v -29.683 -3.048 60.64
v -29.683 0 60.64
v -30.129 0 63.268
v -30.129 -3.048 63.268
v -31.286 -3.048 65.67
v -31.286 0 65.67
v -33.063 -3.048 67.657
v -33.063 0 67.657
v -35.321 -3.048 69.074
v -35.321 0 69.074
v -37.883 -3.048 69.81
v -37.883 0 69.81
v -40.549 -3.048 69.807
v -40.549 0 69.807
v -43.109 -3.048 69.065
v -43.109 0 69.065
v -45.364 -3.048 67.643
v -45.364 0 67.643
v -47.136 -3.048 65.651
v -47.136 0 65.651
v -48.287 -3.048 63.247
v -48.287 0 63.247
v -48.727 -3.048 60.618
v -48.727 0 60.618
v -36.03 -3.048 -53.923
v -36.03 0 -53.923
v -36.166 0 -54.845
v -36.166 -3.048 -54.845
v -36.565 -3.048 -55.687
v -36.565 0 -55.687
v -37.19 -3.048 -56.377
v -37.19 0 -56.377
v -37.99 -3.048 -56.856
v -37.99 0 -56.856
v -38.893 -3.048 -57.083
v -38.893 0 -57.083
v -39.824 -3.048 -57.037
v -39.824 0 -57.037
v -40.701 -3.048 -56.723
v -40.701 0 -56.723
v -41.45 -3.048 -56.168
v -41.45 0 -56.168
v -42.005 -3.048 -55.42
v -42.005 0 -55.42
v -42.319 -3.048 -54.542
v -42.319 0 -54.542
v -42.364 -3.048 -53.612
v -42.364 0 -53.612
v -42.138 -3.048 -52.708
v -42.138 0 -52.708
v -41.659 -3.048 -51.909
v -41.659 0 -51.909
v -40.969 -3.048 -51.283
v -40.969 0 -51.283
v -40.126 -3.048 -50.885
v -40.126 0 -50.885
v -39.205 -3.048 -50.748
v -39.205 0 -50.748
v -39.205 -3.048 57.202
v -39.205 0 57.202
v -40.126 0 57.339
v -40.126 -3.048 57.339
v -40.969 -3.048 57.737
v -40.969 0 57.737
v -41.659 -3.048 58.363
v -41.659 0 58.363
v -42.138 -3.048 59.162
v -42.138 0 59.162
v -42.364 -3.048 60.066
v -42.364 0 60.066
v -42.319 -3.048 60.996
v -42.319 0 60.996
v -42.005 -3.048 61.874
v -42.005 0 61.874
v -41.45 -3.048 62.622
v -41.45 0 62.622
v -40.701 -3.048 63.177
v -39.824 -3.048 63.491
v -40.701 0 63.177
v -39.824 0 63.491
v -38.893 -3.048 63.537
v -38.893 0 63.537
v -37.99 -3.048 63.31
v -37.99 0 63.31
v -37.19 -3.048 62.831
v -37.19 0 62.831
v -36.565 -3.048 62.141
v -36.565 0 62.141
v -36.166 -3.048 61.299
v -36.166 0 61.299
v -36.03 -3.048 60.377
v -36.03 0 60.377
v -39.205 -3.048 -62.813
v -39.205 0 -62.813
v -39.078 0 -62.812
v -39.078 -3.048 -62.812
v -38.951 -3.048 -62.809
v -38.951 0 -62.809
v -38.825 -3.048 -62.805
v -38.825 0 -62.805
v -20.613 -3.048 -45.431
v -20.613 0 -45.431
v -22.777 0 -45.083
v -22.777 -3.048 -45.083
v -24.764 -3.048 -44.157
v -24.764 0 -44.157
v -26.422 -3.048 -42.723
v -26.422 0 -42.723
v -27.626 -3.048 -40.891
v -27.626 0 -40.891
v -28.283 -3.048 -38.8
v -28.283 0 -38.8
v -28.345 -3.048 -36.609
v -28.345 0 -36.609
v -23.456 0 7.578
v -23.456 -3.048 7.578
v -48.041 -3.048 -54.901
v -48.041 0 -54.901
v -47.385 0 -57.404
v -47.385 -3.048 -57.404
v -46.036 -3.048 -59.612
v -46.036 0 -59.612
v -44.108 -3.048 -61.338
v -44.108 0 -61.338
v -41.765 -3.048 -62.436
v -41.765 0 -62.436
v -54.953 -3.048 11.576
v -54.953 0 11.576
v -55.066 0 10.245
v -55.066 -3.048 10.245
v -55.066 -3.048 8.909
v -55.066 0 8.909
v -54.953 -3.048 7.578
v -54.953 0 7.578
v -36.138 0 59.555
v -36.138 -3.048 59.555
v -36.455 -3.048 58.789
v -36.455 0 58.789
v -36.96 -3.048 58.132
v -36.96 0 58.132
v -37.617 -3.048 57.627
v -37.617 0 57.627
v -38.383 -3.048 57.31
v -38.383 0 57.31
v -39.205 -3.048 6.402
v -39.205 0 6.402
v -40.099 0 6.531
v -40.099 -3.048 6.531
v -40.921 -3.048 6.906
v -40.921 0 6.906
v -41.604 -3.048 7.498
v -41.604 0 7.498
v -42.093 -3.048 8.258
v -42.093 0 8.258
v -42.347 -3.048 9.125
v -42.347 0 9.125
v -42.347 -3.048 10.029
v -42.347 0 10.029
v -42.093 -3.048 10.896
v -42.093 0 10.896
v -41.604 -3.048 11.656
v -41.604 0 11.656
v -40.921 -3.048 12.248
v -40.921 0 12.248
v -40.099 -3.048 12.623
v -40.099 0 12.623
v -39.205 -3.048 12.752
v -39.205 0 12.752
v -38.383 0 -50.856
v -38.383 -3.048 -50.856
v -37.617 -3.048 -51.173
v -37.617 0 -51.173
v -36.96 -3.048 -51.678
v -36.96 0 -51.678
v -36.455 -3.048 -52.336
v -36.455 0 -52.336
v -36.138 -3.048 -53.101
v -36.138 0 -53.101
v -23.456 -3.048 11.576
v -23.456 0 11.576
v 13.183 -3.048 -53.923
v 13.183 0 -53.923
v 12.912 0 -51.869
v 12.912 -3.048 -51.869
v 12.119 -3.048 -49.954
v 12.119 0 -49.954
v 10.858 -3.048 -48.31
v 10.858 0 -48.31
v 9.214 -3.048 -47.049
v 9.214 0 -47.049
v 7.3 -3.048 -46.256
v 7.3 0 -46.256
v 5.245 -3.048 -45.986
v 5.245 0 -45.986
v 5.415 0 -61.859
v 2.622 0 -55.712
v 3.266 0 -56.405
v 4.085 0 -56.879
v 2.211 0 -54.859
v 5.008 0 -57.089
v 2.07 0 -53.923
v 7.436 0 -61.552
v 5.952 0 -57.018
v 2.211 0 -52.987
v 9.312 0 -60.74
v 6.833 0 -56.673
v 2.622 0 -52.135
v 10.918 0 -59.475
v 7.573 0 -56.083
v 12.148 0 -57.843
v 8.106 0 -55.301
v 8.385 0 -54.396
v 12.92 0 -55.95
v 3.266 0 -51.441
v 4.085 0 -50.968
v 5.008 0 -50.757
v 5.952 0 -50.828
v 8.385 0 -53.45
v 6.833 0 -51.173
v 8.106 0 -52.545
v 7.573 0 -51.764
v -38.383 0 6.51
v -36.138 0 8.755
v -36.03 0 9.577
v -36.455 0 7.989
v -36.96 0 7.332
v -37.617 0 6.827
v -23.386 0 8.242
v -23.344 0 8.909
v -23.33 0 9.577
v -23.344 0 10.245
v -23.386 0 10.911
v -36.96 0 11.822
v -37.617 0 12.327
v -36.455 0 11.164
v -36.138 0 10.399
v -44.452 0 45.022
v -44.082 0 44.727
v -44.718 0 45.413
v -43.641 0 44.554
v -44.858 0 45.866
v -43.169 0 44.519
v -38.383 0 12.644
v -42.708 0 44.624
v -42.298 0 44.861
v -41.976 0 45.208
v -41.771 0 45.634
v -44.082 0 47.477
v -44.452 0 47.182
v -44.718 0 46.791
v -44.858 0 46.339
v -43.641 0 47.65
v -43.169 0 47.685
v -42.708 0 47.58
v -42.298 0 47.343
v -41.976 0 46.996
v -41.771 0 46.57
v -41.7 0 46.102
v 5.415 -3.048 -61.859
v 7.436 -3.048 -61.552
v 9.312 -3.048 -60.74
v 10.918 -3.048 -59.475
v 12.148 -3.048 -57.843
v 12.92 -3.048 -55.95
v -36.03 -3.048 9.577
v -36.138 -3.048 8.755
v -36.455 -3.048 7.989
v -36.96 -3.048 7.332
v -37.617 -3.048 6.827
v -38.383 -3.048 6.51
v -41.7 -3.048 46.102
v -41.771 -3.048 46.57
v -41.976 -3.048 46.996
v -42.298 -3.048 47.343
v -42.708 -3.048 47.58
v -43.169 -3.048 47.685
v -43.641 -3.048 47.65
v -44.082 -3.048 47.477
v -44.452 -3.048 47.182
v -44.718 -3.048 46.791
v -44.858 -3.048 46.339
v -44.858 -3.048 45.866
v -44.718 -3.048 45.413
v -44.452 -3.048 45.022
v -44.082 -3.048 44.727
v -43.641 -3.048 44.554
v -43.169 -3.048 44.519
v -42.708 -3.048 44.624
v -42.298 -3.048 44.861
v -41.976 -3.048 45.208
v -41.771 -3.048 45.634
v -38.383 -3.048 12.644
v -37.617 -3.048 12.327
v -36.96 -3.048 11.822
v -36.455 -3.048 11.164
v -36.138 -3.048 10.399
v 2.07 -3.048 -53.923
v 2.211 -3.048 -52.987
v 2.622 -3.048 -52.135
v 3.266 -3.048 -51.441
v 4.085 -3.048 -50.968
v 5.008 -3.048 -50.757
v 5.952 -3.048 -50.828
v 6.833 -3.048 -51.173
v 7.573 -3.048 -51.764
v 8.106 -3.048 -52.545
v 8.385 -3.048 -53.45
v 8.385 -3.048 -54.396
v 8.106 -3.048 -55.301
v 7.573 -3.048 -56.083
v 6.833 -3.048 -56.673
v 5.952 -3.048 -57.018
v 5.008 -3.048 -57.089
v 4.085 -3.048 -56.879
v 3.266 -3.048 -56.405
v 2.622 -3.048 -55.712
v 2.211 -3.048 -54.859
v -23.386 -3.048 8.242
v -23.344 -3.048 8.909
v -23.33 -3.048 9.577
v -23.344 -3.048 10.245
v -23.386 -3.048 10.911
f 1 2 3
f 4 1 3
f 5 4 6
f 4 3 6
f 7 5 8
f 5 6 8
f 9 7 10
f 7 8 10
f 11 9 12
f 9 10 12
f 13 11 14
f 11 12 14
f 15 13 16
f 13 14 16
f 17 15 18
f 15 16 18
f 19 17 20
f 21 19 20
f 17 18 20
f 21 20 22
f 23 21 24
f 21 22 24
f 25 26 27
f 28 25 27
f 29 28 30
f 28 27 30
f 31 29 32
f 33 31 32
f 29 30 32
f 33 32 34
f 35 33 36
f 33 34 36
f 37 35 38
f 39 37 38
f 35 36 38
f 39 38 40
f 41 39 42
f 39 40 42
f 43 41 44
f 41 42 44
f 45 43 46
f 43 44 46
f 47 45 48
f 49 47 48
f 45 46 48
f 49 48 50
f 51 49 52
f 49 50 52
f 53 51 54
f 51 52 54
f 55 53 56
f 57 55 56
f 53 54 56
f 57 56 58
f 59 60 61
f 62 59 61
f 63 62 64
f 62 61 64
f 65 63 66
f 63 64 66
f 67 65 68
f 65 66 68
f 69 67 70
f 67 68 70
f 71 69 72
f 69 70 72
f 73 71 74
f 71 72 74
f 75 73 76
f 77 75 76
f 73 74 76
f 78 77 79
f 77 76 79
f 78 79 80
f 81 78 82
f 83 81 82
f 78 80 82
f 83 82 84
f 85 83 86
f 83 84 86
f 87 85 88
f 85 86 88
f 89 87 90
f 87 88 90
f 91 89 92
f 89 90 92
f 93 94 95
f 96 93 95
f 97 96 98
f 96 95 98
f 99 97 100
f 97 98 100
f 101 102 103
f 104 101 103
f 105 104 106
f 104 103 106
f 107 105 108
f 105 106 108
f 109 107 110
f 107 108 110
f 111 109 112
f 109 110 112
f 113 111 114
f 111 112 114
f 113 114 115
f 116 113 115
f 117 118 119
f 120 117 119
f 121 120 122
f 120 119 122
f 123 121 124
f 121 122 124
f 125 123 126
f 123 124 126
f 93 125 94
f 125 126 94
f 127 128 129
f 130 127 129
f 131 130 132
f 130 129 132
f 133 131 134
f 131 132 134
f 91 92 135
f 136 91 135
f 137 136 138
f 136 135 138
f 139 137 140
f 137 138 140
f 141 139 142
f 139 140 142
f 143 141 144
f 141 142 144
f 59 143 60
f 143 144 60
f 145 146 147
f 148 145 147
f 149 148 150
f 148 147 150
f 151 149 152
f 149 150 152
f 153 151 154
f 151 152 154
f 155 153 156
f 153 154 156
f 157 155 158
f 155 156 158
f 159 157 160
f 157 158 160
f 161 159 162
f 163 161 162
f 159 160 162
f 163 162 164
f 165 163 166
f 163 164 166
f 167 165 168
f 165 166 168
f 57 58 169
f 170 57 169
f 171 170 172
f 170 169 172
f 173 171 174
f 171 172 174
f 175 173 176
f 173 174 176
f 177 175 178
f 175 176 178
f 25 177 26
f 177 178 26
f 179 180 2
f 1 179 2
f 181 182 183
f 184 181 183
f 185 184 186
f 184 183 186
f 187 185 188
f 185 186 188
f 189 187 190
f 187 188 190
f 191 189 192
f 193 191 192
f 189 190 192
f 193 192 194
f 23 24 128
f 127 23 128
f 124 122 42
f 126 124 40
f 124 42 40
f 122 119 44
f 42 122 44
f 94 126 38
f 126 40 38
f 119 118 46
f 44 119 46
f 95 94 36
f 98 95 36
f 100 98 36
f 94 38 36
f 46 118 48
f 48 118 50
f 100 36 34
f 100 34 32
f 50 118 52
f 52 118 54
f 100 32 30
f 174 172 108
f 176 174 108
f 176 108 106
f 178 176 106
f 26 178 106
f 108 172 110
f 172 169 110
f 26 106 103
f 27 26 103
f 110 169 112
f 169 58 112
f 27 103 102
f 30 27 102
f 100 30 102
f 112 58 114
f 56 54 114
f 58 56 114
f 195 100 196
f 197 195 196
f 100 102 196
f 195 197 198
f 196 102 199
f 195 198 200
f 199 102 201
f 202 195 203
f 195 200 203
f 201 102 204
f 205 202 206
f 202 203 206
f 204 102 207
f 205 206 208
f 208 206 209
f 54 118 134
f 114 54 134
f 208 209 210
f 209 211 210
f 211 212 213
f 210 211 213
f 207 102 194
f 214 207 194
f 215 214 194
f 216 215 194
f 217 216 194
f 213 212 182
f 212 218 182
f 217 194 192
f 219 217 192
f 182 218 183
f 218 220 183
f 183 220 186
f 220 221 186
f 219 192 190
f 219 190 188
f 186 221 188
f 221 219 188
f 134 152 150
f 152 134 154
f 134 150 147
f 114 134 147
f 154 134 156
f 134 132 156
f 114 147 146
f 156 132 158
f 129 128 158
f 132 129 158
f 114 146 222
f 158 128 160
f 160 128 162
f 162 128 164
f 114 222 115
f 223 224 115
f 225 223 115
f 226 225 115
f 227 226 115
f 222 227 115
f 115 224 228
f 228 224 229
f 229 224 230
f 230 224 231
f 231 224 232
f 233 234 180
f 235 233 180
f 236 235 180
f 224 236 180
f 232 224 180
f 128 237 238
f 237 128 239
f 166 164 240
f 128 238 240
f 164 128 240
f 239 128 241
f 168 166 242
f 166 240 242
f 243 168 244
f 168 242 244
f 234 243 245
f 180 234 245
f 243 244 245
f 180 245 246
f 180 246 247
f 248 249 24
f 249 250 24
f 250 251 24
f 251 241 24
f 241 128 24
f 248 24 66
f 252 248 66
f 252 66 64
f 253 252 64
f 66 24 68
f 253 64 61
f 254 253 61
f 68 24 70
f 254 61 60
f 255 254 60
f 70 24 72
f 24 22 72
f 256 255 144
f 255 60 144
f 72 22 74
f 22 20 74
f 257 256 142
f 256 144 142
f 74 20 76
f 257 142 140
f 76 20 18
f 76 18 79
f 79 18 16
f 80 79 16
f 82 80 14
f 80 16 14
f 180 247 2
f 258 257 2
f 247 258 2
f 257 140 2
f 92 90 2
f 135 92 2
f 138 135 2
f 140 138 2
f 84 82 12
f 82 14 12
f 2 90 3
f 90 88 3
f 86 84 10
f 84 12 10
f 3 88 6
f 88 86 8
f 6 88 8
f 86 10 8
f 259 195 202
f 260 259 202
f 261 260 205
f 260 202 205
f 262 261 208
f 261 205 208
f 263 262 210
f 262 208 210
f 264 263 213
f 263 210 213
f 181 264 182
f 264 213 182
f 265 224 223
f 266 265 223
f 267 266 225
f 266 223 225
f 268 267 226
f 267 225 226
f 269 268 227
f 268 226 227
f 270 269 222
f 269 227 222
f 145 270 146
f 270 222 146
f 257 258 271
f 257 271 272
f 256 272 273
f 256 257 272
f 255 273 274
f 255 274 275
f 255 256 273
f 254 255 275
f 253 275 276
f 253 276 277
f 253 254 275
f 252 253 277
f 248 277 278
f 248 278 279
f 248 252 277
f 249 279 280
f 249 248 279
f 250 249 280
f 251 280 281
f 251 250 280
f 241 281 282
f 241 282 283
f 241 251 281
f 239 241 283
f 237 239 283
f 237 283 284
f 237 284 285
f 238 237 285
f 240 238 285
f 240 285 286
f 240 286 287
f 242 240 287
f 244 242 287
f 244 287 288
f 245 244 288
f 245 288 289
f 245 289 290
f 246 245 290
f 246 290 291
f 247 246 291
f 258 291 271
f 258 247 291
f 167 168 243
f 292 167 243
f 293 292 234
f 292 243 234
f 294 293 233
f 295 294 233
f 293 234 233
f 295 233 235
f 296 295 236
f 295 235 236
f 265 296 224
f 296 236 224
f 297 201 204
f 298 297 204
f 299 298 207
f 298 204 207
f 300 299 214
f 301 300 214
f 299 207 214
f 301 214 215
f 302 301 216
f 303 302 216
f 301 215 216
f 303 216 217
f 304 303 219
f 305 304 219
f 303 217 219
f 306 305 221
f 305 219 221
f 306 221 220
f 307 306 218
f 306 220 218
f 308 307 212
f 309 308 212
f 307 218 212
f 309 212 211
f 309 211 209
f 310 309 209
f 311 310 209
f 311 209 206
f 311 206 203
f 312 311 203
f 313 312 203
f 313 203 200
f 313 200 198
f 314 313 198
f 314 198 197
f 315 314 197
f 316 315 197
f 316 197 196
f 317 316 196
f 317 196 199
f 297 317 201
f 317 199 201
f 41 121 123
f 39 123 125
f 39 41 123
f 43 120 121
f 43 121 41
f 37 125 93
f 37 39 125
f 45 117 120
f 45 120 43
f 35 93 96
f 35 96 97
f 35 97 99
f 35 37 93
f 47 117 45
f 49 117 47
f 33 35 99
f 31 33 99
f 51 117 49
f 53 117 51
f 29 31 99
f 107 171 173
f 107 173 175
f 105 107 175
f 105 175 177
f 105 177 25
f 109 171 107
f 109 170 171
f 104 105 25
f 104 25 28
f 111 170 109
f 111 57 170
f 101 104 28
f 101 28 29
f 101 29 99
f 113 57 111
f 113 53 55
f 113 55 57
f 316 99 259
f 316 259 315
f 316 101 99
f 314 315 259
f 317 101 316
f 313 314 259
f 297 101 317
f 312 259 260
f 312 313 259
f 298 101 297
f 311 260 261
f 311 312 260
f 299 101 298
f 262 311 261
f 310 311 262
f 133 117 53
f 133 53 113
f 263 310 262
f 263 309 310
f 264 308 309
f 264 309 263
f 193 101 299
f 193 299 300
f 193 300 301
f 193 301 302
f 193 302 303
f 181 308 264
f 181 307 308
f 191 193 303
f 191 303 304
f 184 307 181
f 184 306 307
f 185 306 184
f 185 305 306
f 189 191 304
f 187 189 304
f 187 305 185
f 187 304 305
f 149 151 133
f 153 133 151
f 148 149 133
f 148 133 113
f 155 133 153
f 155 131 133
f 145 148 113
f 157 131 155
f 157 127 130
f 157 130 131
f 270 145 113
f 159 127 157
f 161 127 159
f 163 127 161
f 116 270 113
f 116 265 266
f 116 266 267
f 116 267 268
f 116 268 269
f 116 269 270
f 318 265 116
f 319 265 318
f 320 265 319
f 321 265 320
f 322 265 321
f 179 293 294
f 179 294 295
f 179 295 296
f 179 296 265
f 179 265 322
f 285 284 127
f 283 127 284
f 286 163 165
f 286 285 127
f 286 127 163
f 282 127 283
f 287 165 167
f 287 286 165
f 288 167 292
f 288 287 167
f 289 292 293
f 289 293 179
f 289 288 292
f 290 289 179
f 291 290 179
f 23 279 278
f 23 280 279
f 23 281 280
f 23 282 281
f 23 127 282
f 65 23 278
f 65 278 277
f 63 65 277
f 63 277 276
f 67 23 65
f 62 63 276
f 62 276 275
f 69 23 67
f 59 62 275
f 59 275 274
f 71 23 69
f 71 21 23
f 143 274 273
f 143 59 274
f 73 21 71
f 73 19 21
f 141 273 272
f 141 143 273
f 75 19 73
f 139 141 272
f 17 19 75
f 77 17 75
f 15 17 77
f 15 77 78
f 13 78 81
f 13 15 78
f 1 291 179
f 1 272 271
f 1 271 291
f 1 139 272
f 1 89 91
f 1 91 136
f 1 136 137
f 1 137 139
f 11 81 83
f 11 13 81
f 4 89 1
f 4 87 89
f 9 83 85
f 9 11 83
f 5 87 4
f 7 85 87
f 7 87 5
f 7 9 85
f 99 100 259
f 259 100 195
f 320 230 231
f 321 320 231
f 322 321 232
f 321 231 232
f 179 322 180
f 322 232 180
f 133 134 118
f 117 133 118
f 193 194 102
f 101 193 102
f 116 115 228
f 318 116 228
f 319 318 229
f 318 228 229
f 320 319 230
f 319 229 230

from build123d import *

# Parameters (mm, degrees)
F0_R     = 1.5875
F1_DEPTH = 3.048


with BuildPart() as f1:
    # F0 (on Front) → F1 (new body)
    with BuildSketch(Plane.XZ):
        with BuildLine():
            ThreePointArc((-36.0296212806, 9.5769268066), (-36.9595572504, 7.3318627763), (-39.2046212806, 6.4019268066))
            Line((-39.2046212806, 6.4019268066), (-39.2046212806, -6.2980731934))
            ThreePointArc((-39.2046212806, -6.2980731934), (-28.7097632336, -2.3341428168), (-23.4559617675, 7.57809001))
            ThreePointArc((-23.4559617675, 7.57809001), (-23.3612378861, 8.5755139973), (-23.3296212806, 9.5769268066))
            ThreePointArc((-23.3296212806, 9.5769268066), (-23.3612377133, 10.5783368816), (-23.4559610776, 11.5757581675))
            ThreePointArc((-23.4559610776, 11.5757581675), (-28.7097611781, 21.4879946188), (-39.2046212806, 25.4519268066))
            Line((-39.2046212806, 25.4519268066), (-39.2046212806, 12.7519268066))
            ThreePointArc((-39.2046212806, 12.7519268066), (-36.9595572504, 11.8219908368), (-36.0296212806, 9.5769268066))
        make_face()
        with BuildLine():
            Line((-39.2046212806, -6.2980731934), (-39.2046212806, 6.4019268066))
            ThreePointArc((-39.2046212806, 6.4019268066), (-42.3796212806, 9.5769268066), (-39.2046212806, 12.7519268066))
            Line((-39.2046212806, 12.7519268066), (-39.2046212806, 25.4519268066))
            ThreePointArc((-39.2046212806, 25.4519268066), (-49.699208832, 21.4882347585), (-54.9531899929, 11.5764788854))
            ThreePointArc((-54.9531899929, 11.5764788854), (-55.0796212766, 9.5772873178), (-54.9532807938, 7.57809001))
            ThreePointArc((-54.9532807938, 7.57809001), (-49.6994793277, -2.3341428168), (-39.2046212806, -6.2980731934))
        make_face()
        with BuildLine():
            ThreePointArc((-23.4559617675, 7.57809001), (-28.7097632336, -2.3341428168), (-39.2046212806, -6.2980731934))
            Line((-39.2046212806, -6.2980731934), (-39.2046212806, -45.0330734444))
            ThreePointArc((-39.2046212806, -45.0330734444), (-32.9184421733, -47.6368940861), (-30.3146215316, -53.9230731934))
            Line((-30.3146215316, -53.9230731934), (-2.6921212806, -53.9230731934))
            ThreePointArc((-2.6921212806, -53.9230731934), (-0.3672813563, -48.3104131178), (5.2453787194, -45.9855731934))
            Line((5.2453787194, -45.9855731934), (-20.6130872987, -45.4314633533))
            ThreePointArc((-20.6130872987, -45.4314633533), (-26.4219186802, -42.7228782392), (-28.3447482622, -36.6088221602))
            Line((-28.3447482622, -36.6088221602), (-23.4559617675, 7.57809001))
        make_face()
        with BuildLine():
            Line((-39.2046212806, -45.0330734444), (-39.2046212806, -6.2980731934))
            ThreePointArc((-39.2046212806, -6.2980731934), (-49.6994793277, -2.3341428168), (-54.9532807938, 7.57809001))
            Line((-54.9532807938, 7.57809001), (-48.0407045344, -54.9006867526))
            ThreePointArc((-48.0407045344, -54.9006867526), (-45.8274258163, -47.9925963474), (-39.2046212806, -45.0330734444))
        make_face()
        with BuildLine():
            Line((-39.2046212806, 50.8519268066), (-39.2046212806, 25.4519268066))
            ThreePointArc((-39.2046212806, 25.4519268066), (-28.7097611781, 21.4879946188), (-23.4559610776, 11.5757581675))
            Line((-23.4559610776, 11.5757581675), (-29.6832617971, 60.6402490134))
            ThreePointArc((-29.6832617971, 60.6402490134), (-29.6805314532, 60.5086004922), (-29.6796212806, 60.3769268066))
            ThreePointArc((-29.6796212806, 60.3769268066), (-32.4694291898, 53.6417347158), (-39.2046212806, 50.8519268066))
        make_face()
        with BuildLine():
            ThreePointArc((-54.9531899929, 11.5764788854), (-49.699208832, 21.4882347585), (-39.2046212806, 25.4519268066))
            Line((-39.2046212806, 25.4519268066), (-39.2046212806, 50.8519268066))
            ThreePointArc((-39.2046212806, 50.8519268066), (-46.0243552101, 53.7273513216), (-48.7265815015, 60.6175479864))
            Line((-48.7265815015, 60.6175479864), (-54.9531899929, 11.5764788854))
        make_face()
        with Locations((-43.2879850268, 46.1021268066)):
            Circle(F0_R, mode=Mode.SUBTRACT)
        with BuildLine():
            Line((-39.2046212806, -50.7480731934), (-39.2046212806, -45.0330734444))
            ThreePointArc((-39.2046212806, -45.0330734444), (-45.8274258163, -47.9925963474), (-48.0407045344, -54.9006867526))
            ThreePointArc((-48.0407045344, -54.9006867526), (-45.1350981267, -60.5458777291), (-39.2046212806, -62.8130729425))
            Line((-39.2046212806, -62.8130729425), (-38.8245213576, -62.8049434687))
            ThreePointArc((-38.8245213576, -62.8049434687), (-32.7854630898, -60.0733986856), (-30.3146215316, -53.9230731934))
            Line((-30.3146215316, -53.9230731934), (-36.0296212806, -53.9230731934))
            ThreePointArc((-36.0296212806, -53.9230731934), (-41.4496853109, -56.1681372237), (-39.2046212806, -50.7480731934))
        make_face()
        with BuildLine():
            ThreePointArc((-48.7265815015, 60.6175479864), (-46.0243552101, 53.7273513216), (-39.2046212806, 50.8519268066))
            ThreePointArc((-39.2046212806, 50.8519268066), (-32.4694291898, 53.6417347158), (-29.6796212806, 60.3769268066))
            ThreePointArc((-29.6796212806, 60.3769268066), (-29.6805314532, 60.5086004922), (-29.6832617971, 60.6402490134))
            ThreePointArc((-29.6832617971, 60.6402490134), (-39.2159757678, 69.9019200389), (-48.7265815015, 60.6175479864))
        make_face()
        with BuildLine():
            ThreePointArc((-36.0296212806, 60.3769268066), (-36.9595572504, 58.1318627763), (-39.2046212806, 57.2019268066))
            ThreePointArc((-39.2046212806, 57.2019268066), (-41.4496853109, 62.6219908368), (-36.0296212806, 60.3769268066))
        make_face(mode=Mode.SUBTRACT)
        with BuildLine():
            Line((-2.6921212806, -53.9230731934), (-30.3146215316, -53.9230731934))
            ThreePointArc((-30.3146215316, -53.9230731934), (-32.7854630898, -60.0733986856), (-38.8245213576, -62.8049434687))
            Line((-38.8245213576, -62.8049434687), (5.4151049958, -61.8587583712))
            ThreePointArc((5.4151049958, -61.8587583712), (-0.3069497981, -59.5954231725), (-2.6921212806, -53.9230731934))
        make_face()
        with BuildLine():
            ThreePointArc((5.2453787194, -45.9855731934), (-0.3672813563, -48.3104131178), (-2.6921212806, -53.9230731934))
            ThreePointArc((-2.6921212806, -53.9230731934), (-0.3069497981, -59.5954231725), (5.4151049958, -61.8587583712))
            ThreePointArc((5.4151049958, -61.8587583712), (10.9177286984, -59.4754017108), (13.1828787194, -53.9230731934))
            ThreePointArc((13.1828787194, -53.9230731934), (10.858038795, -48.3104131178), (5.2453787194, -45.9855731934))
        make_face()
        with BuildLine():
            ThreePointArc((8.4203787194, -53.9230731934), (5.2453787194, -57.0980731934), (2.0703787194, -53.9230731934))
            ThreePointArc((2.0703787194, -53.9230731934), (5.2453787194, -50.7480731934), (8.4203787194, -53.9230731934))
        make_face(mode=Mode.SUBTRACT)
        with BuildLine():
            ThreePointArc((-39.2046212806, -62.8130729425), (-39.0145278564, -62.8110403417), (-38.8245213576, -62.8049434687))
            Line((-38.8245213576, -62.8049434687), (-39.2046212806, -62.8130729425))
        make_face()
        with BuildLine():
            ThreePointArc((-30.3146215316, -53.9230731934), (-32.9184421733, -47.6368940861), (-39.2046212806, -45.0330734444))
            Line((-39.2046212806, -45.0330734444), (-39.2046212806, -50.7480731934))
            ThreePointArc((-39.2046212806, -50.7480731934), (-36.9595572504, -51.6780091632), (-36.0296212806, -53.9230731934))
            Line((-36.0296212806, -53.9230731934), (-30.3146215316, -53.9230731934))
        make_face()
    extrude(amount=F1_DEPTH)


solid = f1.part
